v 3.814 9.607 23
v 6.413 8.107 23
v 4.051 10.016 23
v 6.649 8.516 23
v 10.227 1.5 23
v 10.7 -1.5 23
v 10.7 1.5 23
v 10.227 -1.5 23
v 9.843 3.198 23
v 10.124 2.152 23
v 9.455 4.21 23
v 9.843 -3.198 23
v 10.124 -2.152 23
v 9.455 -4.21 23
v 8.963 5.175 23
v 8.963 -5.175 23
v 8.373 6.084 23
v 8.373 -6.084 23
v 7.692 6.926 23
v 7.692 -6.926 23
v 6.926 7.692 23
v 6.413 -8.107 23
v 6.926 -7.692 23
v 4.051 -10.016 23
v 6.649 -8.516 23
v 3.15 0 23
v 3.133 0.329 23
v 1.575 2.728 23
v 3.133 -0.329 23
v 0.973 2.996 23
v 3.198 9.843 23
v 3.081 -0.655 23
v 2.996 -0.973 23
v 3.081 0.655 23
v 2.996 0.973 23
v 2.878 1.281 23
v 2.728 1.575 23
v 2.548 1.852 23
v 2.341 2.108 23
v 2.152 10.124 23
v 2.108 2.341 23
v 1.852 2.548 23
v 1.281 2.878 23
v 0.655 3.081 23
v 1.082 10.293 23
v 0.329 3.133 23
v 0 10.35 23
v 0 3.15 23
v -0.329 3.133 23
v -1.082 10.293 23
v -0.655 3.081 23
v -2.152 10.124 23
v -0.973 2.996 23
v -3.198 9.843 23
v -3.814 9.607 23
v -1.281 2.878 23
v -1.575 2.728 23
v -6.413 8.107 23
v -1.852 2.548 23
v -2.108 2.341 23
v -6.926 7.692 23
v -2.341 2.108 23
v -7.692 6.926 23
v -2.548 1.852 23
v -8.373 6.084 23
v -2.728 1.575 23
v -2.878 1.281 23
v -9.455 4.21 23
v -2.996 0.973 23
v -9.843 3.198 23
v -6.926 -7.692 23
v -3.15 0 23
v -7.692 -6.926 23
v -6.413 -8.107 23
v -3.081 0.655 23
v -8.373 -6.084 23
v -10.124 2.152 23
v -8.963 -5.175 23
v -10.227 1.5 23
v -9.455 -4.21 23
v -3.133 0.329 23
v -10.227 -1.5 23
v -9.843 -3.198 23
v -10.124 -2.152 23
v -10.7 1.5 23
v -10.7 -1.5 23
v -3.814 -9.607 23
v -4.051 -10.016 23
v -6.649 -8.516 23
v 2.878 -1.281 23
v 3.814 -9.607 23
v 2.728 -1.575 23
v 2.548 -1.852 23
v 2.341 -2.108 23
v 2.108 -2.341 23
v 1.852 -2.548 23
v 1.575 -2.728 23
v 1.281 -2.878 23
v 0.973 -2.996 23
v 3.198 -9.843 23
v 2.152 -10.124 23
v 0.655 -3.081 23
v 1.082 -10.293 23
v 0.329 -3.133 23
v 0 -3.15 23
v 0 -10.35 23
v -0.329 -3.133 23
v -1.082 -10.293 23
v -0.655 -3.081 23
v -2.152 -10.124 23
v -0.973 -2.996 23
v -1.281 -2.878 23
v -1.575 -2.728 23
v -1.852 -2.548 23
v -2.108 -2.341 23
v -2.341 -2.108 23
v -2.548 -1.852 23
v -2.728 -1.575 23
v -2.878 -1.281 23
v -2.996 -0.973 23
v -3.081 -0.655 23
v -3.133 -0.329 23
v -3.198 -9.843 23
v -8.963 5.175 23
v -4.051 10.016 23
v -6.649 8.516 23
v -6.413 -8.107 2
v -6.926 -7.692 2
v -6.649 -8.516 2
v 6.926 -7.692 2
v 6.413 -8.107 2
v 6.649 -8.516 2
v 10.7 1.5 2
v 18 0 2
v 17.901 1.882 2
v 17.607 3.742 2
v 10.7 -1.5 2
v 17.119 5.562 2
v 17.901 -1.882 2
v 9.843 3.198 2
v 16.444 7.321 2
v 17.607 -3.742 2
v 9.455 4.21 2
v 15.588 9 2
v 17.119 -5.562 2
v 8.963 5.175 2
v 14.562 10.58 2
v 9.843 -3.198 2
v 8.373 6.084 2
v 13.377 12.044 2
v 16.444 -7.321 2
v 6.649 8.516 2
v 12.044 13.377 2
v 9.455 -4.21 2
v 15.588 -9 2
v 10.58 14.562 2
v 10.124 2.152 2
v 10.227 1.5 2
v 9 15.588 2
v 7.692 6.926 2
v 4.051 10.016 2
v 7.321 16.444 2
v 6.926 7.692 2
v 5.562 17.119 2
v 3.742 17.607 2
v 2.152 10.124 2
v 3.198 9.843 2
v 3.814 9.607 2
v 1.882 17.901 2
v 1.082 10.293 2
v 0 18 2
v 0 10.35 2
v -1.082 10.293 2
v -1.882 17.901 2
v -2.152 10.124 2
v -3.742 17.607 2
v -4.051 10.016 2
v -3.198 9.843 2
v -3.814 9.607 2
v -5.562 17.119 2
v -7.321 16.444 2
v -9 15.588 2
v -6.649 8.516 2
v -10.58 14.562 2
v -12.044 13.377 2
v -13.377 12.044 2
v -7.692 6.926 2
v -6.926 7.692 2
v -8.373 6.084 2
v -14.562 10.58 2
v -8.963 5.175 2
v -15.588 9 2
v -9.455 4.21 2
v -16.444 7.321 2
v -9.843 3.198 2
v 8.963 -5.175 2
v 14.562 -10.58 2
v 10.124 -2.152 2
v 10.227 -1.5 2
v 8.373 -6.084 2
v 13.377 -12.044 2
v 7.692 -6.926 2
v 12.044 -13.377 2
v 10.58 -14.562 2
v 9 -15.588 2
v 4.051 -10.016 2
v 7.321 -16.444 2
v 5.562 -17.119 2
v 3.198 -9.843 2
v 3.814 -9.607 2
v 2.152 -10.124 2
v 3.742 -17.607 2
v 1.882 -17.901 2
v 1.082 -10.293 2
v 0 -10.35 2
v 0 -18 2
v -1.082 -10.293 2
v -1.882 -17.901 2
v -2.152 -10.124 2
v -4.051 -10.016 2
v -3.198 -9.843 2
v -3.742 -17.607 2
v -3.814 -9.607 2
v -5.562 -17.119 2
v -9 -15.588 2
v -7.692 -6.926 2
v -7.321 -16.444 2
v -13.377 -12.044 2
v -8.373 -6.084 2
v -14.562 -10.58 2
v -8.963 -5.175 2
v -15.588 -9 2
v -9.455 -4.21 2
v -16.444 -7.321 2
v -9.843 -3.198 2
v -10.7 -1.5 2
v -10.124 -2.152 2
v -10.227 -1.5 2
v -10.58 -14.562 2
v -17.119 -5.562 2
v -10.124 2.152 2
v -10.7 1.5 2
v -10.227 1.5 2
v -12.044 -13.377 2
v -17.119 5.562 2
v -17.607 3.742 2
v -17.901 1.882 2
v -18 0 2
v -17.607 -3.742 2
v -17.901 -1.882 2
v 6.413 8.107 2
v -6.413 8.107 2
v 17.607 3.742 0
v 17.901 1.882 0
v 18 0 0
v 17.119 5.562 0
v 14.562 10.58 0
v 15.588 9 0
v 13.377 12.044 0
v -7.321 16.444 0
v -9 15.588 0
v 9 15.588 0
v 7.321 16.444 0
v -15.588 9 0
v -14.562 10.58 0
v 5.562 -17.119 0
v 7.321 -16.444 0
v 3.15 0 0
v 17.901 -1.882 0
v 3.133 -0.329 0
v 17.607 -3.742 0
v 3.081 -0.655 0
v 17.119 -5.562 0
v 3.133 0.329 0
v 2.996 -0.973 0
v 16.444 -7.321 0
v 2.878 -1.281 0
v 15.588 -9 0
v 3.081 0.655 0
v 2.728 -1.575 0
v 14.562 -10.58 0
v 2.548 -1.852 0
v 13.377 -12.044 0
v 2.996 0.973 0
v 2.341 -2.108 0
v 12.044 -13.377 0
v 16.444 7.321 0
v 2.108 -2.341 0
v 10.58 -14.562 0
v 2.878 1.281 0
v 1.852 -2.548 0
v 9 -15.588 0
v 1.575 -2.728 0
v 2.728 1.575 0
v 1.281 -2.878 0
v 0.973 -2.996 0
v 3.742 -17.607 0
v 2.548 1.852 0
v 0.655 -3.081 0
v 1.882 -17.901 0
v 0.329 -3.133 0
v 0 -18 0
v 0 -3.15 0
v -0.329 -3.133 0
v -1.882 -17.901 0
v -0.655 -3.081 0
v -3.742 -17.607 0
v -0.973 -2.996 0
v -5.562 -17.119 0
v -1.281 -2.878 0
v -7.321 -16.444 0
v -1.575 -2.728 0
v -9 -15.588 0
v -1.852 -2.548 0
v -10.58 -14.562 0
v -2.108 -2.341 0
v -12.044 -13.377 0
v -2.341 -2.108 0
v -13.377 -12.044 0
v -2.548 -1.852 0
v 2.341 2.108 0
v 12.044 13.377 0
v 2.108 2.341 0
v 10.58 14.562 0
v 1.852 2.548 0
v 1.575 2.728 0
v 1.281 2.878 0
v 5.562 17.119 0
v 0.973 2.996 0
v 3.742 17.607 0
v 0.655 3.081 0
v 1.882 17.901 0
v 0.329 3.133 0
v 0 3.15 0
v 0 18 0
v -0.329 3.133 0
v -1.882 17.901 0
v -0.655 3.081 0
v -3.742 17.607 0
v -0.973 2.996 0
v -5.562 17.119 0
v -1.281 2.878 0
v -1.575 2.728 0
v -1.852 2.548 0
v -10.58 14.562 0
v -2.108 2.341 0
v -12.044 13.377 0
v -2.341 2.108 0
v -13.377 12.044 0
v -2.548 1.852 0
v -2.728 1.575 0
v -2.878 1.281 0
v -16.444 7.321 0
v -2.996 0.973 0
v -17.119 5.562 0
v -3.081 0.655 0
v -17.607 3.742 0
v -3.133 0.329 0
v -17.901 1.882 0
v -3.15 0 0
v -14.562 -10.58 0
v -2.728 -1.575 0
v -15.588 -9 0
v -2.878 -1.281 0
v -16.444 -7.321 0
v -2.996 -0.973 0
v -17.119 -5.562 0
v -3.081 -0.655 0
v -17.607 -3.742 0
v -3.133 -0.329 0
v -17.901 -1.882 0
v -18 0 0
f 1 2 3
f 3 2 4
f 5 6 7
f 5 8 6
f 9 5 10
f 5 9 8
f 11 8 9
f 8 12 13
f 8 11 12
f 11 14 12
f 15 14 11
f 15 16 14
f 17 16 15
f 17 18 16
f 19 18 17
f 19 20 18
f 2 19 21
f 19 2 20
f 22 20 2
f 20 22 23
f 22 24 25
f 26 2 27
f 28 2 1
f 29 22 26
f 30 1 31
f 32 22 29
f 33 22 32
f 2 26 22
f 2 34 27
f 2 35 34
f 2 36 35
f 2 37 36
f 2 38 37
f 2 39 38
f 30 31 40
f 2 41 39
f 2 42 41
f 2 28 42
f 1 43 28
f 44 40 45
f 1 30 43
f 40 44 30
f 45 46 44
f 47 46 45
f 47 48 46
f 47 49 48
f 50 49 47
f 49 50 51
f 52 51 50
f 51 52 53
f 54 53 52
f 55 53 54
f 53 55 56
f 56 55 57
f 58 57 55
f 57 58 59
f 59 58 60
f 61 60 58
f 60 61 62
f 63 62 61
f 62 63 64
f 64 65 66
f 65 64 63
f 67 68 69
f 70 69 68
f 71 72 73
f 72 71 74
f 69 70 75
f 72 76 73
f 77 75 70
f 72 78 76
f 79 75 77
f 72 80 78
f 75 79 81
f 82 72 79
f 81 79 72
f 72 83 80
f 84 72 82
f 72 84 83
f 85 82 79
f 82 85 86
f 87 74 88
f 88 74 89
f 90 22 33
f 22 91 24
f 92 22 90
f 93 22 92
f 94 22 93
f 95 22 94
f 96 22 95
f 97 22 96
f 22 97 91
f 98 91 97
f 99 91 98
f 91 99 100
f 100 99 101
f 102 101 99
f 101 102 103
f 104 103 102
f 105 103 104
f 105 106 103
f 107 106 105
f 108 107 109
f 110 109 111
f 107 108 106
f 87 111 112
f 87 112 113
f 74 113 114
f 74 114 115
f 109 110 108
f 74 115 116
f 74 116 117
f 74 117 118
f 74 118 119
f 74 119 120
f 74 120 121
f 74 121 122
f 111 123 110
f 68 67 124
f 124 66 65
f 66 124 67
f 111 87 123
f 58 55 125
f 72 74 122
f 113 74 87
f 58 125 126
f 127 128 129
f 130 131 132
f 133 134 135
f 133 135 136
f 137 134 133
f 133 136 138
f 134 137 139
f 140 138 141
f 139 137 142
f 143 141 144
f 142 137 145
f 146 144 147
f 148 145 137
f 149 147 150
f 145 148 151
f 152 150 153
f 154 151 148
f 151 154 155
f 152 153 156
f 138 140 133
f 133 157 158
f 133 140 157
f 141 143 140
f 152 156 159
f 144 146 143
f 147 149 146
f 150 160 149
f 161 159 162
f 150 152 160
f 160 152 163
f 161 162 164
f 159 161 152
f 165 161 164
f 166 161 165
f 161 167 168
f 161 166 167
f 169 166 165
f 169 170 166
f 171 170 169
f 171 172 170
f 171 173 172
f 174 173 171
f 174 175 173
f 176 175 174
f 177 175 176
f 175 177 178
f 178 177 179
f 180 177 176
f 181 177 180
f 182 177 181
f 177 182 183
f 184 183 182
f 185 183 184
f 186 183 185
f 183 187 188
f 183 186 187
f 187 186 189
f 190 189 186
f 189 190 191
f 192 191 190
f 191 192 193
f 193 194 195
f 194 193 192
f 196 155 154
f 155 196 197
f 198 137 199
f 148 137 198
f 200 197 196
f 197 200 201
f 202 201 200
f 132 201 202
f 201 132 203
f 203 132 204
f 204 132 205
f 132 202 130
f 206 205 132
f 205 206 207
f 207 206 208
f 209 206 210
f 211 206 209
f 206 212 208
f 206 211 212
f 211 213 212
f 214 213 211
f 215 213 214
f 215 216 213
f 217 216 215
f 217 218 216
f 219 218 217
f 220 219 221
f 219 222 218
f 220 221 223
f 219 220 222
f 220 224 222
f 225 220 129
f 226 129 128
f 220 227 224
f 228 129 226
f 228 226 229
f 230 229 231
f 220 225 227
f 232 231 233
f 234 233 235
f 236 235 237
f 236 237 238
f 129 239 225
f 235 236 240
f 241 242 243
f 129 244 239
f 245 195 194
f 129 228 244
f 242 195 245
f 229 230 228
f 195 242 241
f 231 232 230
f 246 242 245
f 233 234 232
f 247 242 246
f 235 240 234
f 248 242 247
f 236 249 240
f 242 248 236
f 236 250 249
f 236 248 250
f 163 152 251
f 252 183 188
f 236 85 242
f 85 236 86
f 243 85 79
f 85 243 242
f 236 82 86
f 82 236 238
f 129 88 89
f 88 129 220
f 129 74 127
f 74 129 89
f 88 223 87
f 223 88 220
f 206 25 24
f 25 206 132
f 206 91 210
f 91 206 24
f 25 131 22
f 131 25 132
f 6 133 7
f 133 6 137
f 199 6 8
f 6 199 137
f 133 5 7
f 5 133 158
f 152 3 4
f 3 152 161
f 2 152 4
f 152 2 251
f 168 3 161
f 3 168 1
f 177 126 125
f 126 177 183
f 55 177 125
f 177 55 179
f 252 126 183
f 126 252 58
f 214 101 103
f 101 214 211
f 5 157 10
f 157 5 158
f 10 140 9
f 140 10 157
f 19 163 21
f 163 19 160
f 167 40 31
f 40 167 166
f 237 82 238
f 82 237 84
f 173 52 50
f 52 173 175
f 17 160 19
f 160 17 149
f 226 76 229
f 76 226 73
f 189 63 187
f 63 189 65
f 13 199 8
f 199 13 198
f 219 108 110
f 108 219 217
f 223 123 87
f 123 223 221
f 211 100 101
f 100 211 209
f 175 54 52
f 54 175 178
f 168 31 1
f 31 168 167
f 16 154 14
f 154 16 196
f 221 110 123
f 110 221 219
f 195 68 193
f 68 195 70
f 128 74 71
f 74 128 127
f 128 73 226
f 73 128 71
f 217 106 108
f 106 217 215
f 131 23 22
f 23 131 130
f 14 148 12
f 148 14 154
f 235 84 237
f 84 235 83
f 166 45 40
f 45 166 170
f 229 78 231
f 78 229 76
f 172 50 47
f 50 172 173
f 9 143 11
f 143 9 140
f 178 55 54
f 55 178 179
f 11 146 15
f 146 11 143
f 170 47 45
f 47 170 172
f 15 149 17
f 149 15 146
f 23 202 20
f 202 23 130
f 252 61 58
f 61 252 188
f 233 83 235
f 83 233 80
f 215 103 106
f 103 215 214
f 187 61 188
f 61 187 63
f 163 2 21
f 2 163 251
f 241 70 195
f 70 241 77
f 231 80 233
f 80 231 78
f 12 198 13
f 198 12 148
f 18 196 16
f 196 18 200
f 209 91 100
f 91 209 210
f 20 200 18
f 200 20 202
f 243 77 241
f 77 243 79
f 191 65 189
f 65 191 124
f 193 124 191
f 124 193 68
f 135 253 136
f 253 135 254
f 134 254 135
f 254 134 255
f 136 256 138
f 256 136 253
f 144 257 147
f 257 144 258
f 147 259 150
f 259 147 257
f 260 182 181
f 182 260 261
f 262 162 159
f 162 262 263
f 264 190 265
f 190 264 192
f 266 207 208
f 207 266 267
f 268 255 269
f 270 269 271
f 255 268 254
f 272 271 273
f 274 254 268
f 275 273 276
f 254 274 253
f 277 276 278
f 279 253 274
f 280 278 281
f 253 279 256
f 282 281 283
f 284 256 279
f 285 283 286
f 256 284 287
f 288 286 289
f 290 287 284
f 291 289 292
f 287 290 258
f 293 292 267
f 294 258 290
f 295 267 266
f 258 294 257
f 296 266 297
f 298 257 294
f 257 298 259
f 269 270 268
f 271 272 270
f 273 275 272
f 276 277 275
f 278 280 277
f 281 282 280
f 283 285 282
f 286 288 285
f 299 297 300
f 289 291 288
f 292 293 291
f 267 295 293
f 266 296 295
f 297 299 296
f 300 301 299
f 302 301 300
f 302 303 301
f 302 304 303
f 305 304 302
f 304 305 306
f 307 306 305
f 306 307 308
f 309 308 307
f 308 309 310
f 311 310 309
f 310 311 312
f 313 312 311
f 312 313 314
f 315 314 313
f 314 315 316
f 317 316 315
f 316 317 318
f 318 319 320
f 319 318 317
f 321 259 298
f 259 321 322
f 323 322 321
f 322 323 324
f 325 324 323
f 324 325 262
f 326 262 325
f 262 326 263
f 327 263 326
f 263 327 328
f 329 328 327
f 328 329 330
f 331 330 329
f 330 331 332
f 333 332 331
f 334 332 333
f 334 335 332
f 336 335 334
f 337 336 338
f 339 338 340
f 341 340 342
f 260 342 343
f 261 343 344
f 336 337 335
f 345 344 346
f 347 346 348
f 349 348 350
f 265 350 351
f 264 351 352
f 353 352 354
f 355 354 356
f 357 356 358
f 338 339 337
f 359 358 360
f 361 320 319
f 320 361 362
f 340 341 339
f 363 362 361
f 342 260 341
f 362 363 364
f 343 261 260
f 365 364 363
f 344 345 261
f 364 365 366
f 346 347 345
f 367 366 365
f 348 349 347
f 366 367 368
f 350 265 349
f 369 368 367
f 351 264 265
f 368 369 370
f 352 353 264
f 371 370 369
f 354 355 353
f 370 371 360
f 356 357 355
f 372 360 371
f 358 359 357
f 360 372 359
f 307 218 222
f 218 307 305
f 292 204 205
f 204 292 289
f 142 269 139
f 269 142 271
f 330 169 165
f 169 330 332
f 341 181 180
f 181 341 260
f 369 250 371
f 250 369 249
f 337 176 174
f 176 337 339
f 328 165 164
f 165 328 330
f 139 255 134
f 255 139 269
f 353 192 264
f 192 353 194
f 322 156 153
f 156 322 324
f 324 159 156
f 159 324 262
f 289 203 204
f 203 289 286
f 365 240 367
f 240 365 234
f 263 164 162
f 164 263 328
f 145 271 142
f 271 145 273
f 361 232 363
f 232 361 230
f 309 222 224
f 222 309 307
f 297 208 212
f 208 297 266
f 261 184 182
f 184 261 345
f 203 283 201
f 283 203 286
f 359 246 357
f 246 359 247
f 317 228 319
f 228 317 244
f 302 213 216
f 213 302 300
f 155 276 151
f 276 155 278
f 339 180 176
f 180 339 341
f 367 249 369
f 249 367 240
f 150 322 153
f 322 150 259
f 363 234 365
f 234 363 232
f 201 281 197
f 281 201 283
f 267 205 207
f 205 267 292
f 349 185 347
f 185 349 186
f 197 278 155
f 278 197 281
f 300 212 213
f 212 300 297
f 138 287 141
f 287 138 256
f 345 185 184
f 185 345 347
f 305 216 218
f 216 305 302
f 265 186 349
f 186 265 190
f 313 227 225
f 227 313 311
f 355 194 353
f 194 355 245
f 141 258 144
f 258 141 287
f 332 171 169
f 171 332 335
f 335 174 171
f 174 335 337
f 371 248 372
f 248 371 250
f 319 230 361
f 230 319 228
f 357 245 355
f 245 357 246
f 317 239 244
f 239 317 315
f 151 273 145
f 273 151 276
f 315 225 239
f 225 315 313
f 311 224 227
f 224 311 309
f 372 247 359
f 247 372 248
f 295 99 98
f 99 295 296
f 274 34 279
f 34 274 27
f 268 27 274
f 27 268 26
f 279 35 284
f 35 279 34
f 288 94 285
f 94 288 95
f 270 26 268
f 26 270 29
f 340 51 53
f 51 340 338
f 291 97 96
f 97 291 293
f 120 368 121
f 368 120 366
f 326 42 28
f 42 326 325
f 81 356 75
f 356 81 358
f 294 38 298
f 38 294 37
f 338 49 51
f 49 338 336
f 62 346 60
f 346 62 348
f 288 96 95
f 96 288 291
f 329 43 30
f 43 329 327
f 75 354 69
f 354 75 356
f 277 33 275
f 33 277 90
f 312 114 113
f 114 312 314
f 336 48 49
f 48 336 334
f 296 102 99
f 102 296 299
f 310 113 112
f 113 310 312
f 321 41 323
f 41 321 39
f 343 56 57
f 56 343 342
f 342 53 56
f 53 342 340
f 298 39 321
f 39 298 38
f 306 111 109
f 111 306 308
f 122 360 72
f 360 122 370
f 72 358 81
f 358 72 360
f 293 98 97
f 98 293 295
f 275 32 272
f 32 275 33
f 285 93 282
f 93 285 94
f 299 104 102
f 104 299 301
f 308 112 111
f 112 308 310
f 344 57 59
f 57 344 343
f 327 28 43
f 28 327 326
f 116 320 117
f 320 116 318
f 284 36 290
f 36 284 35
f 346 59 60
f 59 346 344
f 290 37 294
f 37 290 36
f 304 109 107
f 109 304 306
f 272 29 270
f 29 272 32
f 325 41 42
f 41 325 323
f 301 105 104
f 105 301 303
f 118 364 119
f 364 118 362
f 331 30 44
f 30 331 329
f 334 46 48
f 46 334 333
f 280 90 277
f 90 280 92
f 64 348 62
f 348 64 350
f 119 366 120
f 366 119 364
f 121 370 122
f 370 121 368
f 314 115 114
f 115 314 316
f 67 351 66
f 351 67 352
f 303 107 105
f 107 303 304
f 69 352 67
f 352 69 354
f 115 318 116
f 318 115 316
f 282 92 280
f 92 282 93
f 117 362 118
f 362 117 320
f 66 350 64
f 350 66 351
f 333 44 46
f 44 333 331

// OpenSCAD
// A Base for Solar Lights.
// By Ari M. Diacou
// http://www.thingiverse.com/thing:78398
// A 6"x1/4" landscaping nail gets hammered through the middle, and the light slides on top
// Default values are for a stand tube with an internal diameter of 7/8" for a set of Solar Lights sold by Costco


//Diameter of the male part
D=21;	
	
//Height of the male part, most pieces are around D=H 
H=21; 		

//Height of the base in mm
H2 = 2; 			

//Diameter of the base in mm
D2 = 36; 			

//How much the ribs/male part come past the given diameter D
tolerance = 0.2;	

//How far the ribs come out from the first diameter
delta=0.5;		

//Bore diameter 1/4"=6.35 mm for landscaping stake
B=6.3; 			

Resolution = 60; //internal variable for resolution of rendering
$fn=Resolution; 

number_of_ribs = 6;

rib_thickness = 3;

difference(){ 	//remove the bore from...
	union() {		//add the male part, base and ribs
		translate([0,0,H2]) cylinder(h=H, r=(D+tolerance-delta)/2);		//male part
		cylinder(h=H2, r=D2/2);													//base
		ribs(number_of_ribs);														//ribs, defined below
		}
	cylinder(h=H+H2, r=B/2); 													//the bore
	}

module ribs(n){ //creates n ribs spaced axially around the bore, extending tolerance beyond D/2
	R=D/2+tolerance;
	thickness = rib_thickness;
	if (n > 0){	//if you dont put this in, and call ribs(0), shit crashes
		for ( i = [0 : 5] ){
    			rotate( i * 360 / n, [0, 0, 1])
    			translate([-R, -thickness/2, H2]) 
			cube([R, thickness, H]);
			}
	}
}




			
